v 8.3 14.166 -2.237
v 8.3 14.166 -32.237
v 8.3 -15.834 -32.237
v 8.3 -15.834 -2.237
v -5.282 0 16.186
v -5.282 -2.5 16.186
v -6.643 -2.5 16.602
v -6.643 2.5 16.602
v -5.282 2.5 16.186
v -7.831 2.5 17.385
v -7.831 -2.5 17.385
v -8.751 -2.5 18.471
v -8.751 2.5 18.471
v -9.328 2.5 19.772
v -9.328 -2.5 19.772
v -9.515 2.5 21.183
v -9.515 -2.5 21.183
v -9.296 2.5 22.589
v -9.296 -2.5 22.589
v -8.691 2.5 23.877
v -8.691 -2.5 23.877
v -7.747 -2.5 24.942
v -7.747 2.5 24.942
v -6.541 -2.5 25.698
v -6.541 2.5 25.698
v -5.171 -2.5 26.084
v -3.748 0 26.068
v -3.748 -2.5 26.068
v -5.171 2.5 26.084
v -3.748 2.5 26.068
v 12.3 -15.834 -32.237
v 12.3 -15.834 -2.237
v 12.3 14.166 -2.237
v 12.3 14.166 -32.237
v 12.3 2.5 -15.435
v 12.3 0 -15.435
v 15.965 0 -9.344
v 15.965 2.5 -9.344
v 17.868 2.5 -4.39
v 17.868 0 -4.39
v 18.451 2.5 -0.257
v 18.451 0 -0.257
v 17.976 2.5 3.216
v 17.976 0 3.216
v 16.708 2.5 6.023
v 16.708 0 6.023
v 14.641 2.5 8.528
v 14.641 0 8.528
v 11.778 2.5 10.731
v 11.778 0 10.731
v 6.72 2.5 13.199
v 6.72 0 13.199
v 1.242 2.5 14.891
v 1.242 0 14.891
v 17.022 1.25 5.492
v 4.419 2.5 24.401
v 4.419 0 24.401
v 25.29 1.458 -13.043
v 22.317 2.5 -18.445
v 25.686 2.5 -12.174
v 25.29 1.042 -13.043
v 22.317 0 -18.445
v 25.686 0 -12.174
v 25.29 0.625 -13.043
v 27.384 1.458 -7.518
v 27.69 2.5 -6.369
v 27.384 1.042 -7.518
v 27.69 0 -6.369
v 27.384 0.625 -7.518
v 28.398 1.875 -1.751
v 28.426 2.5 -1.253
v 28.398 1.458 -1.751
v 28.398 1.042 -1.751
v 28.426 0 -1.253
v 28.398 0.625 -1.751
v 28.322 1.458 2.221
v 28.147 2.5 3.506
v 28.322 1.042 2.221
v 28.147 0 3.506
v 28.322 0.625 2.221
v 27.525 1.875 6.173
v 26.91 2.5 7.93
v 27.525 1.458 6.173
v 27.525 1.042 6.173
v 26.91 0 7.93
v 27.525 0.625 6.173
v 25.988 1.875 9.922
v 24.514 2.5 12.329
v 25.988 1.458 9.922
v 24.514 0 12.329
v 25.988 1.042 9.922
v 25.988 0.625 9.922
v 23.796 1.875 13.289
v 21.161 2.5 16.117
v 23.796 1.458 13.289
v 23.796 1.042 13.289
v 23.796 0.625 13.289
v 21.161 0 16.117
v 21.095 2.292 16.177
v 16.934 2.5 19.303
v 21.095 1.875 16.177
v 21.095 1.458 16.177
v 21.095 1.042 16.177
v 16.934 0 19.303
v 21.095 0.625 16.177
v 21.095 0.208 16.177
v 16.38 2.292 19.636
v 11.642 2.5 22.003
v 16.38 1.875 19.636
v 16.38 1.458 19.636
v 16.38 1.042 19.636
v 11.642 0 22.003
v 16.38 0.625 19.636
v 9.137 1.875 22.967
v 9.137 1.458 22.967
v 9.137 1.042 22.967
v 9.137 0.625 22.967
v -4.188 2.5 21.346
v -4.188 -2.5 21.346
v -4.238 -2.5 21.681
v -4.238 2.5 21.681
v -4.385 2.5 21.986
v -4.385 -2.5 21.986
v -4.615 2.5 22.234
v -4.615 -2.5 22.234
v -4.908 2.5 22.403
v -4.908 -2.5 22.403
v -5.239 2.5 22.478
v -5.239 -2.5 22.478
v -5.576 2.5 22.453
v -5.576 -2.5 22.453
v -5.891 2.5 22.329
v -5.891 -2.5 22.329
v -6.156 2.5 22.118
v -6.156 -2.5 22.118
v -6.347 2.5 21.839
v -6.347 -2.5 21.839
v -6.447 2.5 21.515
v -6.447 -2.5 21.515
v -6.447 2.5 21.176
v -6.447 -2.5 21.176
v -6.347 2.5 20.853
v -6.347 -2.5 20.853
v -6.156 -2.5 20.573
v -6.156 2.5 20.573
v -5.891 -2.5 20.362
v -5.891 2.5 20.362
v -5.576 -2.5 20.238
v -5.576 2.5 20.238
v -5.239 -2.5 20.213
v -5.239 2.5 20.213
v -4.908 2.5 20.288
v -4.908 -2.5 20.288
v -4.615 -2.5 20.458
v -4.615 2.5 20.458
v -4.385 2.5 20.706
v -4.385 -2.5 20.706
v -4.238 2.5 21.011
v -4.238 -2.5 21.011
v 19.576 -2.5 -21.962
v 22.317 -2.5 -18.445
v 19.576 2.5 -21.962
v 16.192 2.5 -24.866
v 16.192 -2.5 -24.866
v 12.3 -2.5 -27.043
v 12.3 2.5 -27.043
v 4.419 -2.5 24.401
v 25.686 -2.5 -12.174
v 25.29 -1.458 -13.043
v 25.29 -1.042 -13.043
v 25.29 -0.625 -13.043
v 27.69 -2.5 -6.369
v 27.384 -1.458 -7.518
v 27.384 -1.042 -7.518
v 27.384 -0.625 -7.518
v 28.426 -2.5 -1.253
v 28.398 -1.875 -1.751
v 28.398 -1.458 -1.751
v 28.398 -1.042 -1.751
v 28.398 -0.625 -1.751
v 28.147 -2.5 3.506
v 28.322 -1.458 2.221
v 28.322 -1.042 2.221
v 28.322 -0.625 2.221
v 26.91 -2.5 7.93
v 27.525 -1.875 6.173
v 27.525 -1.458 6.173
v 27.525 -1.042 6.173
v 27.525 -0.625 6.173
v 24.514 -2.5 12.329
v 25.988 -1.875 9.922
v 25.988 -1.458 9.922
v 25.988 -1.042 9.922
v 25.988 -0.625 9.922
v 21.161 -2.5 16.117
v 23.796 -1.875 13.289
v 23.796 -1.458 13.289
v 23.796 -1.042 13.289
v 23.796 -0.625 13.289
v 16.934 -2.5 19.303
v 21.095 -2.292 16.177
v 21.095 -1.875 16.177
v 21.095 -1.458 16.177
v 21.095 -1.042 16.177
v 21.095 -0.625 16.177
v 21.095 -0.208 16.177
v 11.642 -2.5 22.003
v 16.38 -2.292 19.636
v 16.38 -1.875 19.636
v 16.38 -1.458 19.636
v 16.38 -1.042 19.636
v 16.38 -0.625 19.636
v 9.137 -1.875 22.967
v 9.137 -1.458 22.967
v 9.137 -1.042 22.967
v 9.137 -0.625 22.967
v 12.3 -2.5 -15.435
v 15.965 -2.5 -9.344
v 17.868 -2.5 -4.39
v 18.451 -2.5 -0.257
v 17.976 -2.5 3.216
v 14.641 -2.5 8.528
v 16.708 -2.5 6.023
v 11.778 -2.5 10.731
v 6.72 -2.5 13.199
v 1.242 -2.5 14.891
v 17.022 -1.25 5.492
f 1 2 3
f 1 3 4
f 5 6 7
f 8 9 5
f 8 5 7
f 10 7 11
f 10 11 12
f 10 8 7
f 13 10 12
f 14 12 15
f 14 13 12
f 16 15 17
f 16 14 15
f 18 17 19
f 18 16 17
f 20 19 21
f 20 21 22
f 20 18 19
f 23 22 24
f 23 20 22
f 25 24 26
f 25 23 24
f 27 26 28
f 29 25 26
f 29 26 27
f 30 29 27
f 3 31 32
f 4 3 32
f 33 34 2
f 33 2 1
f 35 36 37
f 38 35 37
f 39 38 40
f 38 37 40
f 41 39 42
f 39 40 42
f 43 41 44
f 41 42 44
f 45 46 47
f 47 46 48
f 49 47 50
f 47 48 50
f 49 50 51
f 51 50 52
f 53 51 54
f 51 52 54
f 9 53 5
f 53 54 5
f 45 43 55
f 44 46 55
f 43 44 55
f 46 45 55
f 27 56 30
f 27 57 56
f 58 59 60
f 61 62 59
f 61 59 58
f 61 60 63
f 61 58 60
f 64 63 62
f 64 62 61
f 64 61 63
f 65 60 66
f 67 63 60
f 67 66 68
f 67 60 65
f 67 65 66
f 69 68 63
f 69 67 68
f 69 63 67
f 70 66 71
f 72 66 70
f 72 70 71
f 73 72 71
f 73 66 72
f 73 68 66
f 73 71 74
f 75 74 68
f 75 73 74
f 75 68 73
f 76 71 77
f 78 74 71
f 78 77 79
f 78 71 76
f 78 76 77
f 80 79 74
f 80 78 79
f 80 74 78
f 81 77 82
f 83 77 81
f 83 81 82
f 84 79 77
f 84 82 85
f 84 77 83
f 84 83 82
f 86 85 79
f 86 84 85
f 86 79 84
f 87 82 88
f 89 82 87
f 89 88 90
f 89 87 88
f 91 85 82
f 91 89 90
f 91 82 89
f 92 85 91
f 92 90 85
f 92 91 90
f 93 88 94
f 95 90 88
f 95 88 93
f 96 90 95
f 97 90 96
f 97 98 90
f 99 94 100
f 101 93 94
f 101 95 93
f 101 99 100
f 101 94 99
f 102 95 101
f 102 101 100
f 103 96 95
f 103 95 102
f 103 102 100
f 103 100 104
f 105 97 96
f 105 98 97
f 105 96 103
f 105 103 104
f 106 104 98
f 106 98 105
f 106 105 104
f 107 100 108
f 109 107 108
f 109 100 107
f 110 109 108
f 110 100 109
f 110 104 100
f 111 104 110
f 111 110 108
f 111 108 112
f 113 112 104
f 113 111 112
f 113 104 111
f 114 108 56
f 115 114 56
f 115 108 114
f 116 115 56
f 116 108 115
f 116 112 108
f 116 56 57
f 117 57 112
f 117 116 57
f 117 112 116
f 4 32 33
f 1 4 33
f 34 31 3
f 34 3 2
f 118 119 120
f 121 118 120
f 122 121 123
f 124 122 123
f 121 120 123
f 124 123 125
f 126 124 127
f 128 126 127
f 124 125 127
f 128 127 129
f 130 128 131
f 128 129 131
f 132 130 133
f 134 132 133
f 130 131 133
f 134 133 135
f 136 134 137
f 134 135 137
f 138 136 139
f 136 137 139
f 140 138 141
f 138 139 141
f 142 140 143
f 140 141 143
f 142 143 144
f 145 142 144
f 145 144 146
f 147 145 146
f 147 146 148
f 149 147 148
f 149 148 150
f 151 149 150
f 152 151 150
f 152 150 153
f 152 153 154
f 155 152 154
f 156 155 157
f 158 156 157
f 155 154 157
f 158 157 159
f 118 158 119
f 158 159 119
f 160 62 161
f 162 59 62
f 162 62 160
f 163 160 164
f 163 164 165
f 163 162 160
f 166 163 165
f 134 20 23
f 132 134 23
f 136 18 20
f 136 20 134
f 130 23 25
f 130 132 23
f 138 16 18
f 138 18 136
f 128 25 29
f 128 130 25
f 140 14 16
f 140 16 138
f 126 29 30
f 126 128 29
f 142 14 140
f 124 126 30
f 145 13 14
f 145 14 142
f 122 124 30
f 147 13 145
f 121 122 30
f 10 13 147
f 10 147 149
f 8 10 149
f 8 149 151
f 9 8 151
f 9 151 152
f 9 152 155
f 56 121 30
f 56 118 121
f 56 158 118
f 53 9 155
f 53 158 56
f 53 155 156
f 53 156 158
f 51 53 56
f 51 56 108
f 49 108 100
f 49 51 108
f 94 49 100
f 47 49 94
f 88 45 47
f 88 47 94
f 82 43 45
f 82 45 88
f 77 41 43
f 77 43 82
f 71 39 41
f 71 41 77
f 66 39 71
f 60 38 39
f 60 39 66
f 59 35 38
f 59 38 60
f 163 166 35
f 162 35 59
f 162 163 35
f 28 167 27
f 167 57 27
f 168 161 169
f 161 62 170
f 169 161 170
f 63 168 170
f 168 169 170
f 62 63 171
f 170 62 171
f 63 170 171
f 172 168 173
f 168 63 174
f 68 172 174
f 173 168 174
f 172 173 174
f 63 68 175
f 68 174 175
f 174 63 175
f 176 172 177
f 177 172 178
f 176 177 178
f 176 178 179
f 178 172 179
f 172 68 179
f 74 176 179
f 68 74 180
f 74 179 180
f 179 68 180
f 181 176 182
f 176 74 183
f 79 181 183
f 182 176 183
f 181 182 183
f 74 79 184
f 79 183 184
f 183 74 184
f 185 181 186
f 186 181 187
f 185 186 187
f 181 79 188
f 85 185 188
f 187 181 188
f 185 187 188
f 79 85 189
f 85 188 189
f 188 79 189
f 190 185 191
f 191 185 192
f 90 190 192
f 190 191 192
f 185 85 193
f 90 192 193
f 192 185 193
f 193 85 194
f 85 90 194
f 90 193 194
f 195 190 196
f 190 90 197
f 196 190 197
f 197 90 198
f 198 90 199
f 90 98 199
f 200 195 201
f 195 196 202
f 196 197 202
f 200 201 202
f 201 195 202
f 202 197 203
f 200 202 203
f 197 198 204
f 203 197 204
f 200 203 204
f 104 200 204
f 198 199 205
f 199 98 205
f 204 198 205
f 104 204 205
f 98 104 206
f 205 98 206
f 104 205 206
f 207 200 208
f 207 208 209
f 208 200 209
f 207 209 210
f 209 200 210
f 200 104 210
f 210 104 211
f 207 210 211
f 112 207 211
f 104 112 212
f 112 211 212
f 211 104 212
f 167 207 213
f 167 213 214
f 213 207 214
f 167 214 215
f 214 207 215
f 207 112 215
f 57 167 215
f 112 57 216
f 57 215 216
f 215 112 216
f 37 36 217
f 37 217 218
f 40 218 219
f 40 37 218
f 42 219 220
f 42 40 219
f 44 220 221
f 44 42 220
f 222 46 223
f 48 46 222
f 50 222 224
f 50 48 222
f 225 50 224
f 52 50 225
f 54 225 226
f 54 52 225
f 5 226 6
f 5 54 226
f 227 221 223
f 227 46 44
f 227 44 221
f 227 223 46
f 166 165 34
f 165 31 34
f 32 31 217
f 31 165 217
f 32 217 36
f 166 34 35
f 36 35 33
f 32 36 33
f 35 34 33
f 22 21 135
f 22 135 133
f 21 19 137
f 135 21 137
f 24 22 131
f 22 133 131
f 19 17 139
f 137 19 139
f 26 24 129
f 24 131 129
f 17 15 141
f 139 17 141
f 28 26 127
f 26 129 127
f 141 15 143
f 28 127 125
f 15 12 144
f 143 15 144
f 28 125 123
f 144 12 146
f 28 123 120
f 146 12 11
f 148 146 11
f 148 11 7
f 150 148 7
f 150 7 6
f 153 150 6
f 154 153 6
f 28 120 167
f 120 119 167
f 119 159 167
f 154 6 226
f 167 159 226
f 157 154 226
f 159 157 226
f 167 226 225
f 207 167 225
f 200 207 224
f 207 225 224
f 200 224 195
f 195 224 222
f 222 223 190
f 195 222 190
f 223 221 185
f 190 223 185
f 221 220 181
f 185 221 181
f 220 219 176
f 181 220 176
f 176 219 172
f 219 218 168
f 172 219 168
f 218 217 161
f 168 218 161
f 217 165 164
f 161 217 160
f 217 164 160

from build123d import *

# Parameters (mm, degrees)
BOSS_EXTRUDE1_DEPTH      = 2.5
BOSS_EXTRUDE1_DEPTH_BACK = 2.5
SKETCH2_W                = 30
SKETCH2_H                = 30
BOSS_EXTRUDE2_DEPTH      = 4
CUT_EXTRUDE1_DEPTH       = 47.112311827
CUT_EXTRUDE1_DEPTH_BACK  = 5
SKETCH3_R                = 1.135899117


with BuildPart() as part:
    # Sketch1 → Boss-Extrude1 (new, two sides: drawn at the far end of the back side and taken through both)
    with BuildSketch(Plane(origin=(0, 0, 0), x_dir=(1, 0, 0), z_dir=(0, 1, 0)).offset(-BOSS_EXTRUDE1_DEPTH_BACK)):
        with BuildLine():
            Line((12.299846055, 27.042802031), (12.299846055, 15.43488972))
            add(Edge.make_bspline(
                [(12.299846055, 15.43488972), (30.534020994, -10.609424361), (-5.28178023, -16.186011799)],
                knots=[0, 0, 0, 1, 1, 1], degree=2))
            ThreePointArc((-5.28178023, -16.186011799), (-9.455741342, -21.893729502), (-3.748023639, -26.067690614))
            add(Edge.make_bspline(
                [(22.317047717, 18.444557689), (24.010987248, 15.756852788), (26.568030042, 10.329200416), (28.199135579, 4.70608307), (28.530980206, -0.219774719), (28.112095037, -4.221352146), (26.937580955, -8.124121484), (25.039004829, -11.720082951), (22.553291074, -14.857561986), (18.908458845, -18.15546642), (13.009520485, -21.610616265), (6.232054982, -23.983751971), (-0.197461384, -25.517985733), (-3.748023639, -26.067690614)],
                knots=[0.045025553, 0.045025553, 0.045025553, 0.134554407, 0.224083261, 0.313612116, 0.373298019, 0.432983922, 0.492669825, 0.552355728, 0.612041631, 0.701570485, 0.820942291, 0.910471146, 1, 1, 1], degree=2))
            ThreePointArc((22.317047717, 18.444557689), (17.956231252, 23.498367255), (12.299846055, 27.042802031))
        make_face()
    extrude(amount=BOSS_EXTRUDE1_DEPTH + BOSS_EXTRUDE1_DEPTH_BACK)

    # Sketch2 → Boss-Extrude2 (add)
    with BuildSketch(Plane.ZY.offset(-12.299846055)):
        with Locations((-17.236867662, -0.834397369)):
            Rectangle(SKETCH2_W, SKETCH2_H)
    extrude(amount=BOSS_EXTRUDE2_DEPTH)

    # Sketch3 → Cut-Extrude1 (cut, two sides: drawn at the far end of the back side and taken through both)
    with BuildSketch(Plane.XZ.offset(2.5).offset(-CUT_EXTRUDE1_DEPTH_BACK)):
        with Locations((-5.323414867, 21.345746187)):
            Circle(SKETCH3_R)
    extrude(amount=CUT_EXTRUDE1_DEPTH + CUT_EXTRUDE1_DEPTH_BACK, mode=Mode.SUBTRACT)


solid = part.part
